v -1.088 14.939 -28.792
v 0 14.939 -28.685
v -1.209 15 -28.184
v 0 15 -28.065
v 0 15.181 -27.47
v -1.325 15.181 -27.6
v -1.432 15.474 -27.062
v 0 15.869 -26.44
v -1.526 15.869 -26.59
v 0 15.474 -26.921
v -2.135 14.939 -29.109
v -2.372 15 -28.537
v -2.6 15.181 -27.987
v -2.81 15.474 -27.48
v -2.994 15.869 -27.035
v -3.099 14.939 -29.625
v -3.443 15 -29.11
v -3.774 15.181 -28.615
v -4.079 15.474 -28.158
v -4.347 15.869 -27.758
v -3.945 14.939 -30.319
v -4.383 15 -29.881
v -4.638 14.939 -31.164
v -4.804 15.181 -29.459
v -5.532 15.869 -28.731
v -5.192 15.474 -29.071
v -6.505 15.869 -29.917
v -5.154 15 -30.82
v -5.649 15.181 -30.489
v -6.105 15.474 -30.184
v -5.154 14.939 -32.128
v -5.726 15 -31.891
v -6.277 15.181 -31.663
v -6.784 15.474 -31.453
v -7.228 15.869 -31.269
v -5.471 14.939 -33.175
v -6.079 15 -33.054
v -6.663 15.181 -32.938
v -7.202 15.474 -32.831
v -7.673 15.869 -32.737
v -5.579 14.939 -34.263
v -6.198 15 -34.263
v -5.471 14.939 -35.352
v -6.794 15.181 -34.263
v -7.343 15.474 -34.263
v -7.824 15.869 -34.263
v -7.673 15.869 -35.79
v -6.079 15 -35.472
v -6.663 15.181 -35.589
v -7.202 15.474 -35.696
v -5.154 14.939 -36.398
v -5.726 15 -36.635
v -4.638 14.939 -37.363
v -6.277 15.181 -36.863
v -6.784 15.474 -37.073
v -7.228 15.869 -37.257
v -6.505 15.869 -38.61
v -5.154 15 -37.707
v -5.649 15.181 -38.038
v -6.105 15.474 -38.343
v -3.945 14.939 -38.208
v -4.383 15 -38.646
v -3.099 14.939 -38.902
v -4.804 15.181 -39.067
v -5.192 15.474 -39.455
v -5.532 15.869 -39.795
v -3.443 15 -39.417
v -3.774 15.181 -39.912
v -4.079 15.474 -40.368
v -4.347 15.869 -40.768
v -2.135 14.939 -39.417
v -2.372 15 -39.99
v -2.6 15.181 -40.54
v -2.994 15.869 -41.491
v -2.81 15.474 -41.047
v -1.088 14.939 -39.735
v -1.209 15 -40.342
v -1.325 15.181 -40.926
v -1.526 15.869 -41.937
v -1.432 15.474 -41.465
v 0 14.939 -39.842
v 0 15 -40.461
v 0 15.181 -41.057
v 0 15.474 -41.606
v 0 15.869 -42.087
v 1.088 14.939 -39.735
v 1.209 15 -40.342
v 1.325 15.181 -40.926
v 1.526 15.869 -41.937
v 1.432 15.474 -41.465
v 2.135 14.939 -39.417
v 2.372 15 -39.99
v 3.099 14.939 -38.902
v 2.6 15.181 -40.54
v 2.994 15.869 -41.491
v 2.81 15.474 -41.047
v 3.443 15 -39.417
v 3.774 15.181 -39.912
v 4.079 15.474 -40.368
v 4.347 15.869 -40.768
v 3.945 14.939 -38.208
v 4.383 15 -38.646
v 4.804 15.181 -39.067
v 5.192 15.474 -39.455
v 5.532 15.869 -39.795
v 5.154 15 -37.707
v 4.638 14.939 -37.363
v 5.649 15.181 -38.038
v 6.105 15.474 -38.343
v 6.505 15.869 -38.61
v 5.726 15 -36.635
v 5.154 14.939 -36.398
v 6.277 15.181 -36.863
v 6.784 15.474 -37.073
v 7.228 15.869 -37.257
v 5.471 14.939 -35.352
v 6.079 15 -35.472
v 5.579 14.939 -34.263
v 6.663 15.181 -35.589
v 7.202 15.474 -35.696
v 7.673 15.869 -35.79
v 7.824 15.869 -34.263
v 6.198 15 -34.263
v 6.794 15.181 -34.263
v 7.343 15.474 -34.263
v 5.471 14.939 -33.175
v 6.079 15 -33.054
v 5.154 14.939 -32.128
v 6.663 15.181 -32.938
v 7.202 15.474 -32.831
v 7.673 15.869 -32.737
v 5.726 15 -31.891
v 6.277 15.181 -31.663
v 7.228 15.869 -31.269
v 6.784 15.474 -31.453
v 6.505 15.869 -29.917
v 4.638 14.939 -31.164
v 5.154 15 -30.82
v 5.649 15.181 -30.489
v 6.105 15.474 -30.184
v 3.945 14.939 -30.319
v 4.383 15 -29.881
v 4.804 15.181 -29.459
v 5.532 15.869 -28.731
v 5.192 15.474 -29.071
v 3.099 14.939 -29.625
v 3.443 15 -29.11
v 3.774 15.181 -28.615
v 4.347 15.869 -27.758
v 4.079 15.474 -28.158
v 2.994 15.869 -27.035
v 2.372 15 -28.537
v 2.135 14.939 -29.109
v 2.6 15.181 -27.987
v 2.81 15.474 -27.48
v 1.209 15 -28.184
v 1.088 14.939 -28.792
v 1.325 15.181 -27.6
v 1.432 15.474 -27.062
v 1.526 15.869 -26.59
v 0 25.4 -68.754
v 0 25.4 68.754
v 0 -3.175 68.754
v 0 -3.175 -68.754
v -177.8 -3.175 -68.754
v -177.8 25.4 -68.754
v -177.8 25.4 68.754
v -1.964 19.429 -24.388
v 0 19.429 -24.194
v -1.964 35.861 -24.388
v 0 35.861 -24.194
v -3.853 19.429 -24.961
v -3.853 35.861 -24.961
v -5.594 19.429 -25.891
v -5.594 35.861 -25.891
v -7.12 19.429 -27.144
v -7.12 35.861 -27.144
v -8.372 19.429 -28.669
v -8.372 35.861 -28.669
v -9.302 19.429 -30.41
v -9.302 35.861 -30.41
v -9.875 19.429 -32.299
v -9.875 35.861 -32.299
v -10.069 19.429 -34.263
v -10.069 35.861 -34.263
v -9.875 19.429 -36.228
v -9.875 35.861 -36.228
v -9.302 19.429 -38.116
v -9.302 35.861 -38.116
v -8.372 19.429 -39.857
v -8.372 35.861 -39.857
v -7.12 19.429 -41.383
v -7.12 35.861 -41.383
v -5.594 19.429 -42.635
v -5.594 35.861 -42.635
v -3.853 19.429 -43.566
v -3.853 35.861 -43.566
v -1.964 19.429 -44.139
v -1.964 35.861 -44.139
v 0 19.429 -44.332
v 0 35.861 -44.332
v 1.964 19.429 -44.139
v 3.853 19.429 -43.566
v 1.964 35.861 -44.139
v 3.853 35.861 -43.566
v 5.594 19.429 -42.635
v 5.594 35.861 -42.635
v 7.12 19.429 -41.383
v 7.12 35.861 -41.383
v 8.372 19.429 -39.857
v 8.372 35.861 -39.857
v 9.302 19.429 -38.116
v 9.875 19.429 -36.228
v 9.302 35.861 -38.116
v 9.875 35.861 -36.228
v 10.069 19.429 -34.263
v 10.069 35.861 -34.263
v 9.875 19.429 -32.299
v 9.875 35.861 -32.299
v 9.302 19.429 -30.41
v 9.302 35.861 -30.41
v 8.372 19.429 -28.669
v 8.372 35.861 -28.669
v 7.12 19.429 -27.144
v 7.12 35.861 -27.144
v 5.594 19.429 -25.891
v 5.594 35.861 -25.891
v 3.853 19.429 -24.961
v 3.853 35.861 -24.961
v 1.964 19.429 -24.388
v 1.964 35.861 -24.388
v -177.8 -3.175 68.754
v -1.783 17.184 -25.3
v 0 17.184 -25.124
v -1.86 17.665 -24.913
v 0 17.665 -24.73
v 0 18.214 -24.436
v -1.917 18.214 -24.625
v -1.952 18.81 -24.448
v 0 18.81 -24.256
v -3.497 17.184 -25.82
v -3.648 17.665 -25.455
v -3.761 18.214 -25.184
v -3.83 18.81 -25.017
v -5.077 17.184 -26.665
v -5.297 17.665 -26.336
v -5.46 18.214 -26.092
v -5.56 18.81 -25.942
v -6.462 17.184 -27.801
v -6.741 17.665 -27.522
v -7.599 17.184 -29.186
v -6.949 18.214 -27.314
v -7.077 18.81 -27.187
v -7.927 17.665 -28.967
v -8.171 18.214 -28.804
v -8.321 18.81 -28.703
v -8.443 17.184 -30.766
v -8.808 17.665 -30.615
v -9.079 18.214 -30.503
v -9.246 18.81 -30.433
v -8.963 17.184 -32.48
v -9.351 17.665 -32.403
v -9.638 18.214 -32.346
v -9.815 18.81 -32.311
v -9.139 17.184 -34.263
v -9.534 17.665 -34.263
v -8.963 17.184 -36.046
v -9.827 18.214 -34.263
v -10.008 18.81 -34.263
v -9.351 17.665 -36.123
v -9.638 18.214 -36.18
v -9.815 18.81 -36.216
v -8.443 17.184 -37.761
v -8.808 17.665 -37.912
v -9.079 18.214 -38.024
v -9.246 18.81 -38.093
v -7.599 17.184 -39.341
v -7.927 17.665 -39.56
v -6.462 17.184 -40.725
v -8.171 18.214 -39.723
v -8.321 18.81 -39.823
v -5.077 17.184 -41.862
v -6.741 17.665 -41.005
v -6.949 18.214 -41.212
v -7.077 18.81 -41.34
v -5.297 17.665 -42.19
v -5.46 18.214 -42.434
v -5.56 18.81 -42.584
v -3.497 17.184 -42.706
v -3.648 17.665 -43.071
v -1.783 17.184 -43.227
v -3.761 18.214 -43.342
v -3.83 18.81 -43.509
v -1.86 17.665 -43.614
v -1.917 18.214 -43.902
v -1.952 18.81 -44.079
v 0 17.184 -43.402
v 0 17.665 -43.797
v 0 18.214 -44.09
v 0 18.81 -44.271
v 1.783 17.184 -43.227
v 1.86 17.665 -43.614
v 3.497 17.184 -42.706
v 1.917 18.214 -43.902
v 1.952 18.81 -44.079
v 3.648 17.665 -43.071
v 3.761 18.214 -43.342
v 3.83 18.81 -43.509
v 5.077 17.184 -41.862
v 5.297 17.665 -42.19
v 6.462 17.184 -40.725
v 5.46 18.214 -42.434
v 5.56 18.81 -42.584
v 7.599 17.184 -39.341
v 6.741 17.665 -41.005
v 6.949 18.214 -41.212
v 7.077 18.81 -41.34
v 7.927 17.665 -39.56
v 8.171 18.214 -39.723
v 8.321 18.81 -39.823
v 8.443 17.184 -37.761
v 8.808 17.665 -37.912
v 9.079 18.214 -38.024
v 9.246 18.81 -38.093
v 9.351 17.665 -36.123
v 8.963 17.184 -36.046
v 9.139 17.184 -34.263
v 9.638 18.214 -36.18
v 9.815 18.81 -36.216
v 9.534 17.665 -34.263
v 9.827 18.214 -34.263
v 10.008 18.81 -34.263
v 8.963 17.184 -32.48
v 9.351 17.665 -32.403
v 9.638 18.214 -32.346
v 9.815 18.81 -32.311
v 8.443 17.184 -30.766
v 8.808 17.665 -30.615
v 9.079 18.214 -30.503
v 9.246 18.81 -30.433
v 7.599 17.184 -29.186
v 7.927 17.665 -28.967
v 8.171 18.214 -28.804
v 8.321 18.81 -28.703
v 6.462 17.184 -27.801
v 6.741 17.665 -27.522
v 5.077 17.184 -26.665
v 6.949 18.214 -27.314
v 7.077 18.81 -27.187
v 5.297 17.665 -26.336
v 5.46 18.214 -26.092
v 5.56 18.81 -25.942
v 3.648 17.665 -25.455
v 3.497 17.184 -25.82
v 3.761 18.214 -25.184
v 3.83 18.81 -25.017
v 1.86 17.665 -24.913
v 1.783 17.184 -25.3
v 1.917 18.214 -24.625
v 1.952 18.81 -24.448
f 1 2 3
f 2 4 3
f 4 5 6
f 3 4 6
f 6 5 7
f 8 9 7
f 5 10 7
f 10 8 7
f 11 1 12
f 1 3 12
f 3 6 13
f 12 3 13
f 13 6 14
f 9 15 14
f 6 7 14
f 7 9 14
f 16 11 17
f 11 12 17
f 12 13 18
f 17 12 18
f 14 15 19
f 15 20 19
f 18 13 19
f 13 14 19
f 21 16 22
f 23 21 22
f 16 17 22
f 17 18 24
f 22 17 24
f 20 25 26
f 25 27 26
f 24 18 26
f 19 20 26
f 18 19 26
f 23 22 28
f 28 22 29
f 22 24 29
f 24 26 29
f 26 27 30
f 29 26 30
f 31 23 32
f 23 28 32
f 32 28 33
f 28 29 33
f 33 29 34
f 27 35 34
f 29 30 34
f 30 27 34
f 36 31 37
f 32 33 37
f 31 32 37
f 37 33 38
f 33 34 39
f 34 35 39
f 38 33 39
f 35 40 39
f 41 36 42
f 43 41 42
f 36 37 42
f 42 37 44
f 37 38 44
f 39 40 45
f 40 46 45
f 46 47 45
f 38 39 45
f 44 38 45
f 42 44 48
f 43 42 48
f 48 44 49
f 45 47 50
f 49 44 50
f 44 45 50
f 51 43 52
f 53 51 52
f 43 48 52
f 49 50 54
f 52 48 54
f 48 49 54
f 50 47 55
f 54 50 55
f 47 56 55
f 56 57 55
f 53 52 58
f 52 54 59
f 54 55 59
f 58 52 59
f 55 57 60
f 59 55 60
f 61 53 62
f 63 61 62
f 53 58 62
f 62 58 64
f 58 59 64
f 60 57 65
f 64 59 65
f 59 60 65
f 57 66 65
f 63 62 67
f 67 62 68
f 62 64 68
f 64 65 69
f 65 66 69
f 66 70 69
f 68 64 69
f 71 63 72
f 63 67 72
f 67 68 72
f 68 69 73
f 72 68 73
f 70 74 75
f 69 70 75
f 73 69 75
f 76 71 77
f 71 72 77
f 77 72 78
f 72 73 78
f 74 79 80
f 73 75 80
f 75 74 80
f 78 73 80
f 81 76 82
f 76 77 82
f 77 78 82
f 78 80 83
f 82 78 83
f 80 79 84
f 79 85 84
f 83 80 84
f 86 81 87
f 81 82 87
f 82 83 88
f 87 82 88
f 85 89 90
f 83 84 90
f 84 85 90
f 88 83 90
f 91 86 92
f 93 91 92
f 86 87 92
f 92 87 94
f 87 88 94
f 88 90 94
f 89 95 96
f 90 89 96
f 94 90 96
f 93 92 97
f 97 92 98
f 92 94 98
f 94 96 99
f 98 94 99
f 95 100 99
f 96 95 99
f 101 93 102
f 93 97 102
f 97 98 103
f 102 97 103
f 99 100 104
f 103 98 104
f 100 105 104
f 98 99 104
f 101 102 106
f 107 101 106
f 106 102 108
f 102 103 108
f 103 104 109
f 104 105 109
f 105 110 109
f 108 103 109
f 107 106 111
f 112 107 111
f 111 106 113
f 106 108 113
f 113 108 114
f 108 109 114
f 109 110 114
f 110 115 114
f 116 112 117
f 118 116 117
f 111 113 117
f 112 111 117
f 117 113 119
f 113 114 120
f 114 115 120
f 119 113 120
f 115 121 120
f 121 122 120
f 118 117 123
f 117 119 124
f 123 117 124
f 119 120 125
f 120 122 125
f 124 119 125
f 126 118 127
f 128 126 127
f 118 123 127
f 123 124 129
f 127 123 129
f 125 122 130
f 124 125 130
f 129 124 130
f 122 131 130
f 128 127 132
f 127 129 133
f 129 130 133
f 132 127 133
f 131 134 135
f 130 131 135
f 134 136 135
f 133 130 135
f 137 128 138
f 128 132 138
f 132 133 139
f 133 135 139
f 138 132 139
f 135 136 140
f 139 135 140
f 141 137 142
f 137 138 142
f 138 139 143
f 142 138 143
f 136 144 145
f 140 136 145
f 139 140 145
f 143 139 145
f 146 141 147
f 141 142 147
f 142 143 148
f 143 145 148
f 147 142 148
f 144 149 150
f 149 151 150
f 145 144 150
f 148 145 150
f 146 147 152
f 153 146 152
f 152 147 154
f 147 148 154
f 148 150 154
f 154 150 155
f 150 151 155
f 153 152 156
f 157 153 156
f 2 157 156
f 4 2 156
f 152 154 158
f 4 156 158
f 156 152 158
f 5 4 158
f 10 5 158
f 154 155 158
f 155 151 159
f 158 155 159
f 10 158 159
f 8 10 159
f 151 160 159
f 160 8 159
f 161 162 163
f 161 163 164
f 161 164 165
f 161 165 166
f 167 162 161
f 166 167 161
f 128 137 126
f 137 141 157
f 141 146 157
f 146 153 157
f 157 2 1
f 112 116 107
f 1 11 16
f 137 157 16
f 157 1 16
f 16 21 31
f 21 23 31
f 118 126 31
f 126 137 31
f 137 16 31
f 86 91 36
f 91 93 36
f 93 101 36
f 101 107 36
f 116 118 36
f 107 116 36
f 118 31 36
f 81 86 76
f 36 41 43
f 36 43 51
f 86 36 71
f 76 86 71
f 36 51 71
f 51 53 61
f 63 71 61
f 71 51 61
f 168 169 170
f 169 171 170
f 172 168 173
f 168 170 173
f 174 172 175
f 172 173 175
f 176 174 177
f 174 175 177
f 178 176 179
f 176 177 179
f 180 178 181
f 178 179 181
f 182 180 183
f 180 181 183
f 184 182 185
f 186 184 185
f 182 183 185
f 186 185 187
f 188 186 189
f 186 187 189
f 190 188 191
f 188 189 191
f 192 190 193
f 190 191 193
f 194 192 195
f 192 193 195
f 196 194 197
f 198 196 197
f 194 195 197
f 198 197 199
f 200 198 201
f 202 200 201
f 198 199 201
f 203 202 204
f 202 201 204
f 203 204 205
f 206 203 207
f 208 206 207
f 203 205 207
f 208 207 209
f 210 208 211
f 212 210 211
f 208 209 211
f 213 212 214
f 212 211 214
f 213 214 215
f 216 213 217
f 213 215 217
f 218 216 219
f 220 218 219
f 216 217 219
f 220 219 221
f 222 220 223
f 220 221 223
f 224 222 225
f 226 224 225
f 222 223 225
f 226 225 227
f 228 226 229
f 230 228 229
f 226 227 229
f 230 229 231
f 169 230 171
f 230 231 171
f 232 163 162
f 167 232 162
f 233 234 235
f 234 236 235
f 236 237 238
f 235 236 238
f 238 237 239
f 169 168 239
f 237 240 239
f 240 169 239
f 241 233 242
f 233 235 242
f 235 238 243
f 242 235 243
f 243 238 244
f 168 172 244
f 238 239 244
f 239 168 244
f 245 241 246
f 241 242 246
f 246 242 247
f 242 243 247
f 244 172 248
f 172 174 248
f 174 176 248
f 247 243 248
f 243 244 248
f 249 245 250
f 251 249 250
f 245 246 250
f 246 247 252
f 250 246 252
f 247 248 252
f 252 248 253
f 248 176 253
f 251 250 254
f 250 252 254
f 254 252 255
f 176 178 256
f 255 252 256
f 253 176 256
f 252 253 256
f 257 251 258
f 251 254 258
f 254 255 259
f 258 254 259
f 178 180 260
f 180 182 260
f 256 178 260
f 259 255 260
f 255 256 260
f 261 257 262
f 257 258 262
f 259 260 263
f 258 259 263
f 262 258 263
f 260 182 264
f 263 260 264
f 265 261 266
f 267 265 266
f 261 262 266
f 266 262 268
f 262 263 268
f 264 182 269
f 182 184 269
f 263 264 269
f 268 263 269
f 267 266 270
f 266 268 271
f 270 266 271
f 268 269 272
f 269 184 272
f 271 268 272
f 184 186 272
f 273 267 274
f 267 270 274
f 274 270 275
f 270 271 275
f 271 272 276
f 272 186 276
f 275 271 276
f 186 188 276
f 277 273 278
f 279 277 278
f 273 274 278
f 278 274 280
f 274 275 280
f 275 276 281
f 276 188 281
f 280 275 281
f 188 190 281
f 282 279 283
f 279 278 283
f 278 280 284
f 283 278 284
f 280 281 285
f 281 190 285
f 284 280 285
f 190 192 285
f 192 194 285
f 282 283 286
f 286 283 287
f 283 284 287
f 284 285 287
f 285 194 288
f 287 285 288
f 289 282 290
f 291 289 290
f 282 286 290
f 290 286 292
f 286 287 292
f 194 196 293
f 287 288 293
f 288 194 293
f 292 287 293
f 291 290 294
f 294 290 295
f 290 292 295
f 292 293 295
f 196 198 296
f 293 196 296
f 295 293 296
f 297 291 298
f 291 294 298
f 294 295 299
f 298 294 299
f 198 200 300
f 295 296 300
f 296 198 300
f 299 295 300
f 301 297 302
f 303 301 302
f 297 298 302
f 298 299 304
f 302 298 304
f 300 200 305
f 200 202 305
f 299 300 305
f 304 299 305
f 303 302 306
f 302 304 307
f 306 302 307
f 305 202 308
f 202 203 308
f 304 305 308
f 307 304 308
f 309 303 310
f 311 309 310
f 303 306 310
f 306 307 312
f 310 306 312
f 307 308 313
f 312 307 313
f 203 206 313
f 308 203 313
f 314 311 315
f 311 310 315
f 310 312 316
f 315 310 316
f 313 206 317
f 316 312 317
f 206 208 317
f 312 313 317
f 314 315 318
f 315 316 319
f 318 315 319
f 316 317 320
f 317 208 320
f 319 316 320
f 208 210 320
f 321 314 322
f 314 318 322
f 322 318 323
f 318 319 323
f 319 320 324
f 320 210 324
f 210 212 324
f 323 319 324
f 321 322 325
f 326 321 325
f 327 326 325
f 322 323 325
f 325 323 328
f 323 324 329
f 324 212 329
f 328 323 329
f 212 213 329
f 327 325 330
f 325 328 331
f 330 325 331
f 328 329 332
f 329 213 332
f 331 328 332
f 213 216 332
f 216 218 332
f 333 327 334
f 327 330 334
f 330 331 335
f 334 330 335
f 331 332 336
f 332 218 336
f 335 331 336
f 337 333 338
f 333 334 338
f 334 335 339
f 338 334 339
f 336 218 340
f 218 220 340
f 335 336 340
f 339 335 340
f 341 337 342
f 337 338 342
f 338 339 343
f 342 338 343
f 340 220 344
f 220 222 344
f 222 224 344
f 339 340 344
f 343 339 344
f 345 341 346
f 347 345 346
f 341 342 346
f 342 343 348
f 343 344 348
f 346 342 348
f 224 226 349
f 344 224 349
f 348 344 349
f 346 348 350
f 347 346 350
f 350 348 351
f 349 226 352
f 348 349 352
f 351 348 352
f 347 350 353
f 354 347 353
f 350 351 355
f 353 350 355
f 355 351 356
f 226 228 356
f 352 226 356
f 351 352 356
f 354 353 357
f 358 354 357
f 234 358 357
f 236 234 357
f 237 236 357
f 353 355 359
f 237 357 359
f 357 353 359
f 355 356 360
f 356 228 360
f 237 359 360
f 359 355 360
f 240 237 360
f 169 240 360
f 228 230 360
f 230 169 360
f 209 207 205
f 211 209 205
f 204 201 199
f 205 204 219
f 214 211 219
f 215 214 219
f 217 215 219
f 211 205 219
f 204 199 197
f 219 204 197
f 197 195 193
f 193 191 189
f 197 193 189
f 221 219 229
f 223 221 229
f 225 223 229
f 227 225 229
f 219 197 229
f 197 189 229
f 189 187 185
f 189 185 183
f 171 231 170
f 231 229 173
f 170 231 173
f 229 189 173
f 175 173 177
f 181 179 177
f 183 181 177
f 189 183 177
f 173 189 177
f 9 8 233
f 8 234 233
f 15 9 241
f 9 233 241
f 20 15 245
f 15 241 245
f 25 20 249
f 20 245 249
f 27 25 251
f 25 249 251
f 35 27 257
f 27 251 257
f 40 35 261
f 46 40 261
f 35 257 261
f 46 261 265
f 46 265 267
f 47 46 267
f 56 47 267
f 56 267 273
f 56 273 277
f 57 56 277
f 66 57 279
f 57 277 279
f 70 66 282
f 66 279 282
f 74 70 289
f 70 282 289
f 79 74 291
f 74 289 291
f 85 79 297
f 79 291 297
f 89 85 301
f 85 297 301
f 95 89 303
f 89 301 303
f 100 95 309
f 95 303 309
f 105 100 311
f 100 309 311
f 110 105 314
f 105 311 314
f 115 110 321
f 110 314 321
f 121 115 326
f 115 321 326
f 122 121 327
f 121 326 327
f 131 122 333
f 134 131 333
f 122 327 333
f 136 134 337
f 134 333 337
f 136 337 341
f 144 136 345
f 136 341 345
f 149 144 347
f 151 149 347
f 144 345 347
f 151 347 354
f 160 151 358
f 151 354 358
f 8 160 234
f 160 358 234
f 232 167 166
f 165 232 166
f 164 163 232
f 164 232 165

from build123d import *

# Parameters (mm, degrees)
SKETCH1_W      = 137.507065568
SKETCH1_H      = 28.575
EXTRUDE1_DEPTH = 177.8


with BuildPart() as part:
    # Sketch1 → Extrude1 (new body)
    with BuildSketch(Plane(origin=(0, 0, 0), x_dir=(0, 0, -1), z_dir=(1, 0, 0))):
        with Locations((0, 11.1125)):
            Rectangle(SKETCH1_W, SKETCH1_H)
    extrude(amount=-EXTRUDE1_DEPTH)


with BuildPart() as body_2:
    # Sketch2 → Revolve1 (revolve)
    with BuildSketch(Plane(origin=(0, 0, 0), x_dir=(0, 0, -1), z_dir=(1, 0, 0)), mode=Mode.PRIVATE) as revolve1_sk:
        with BuildLine():
            Line((34.263280918, 35.860824198), (34.263280918, 14.939175802))
            Line((34.263280918, 14.939175802), (39.841939145, 14.939175802))
            ThreePointArc((39.841939145, 14.939175802), (41.056959043, 15.180858287), (42.087003175, 15.869111772))
            Line((42.087003175, 15.869111772), (43.402131236, 17.184239833))
            ThreePointArc((43.402131236, 17.184239833), (44.090384721, 18.214283965), (44.332067206, 19.429303863))
            Line((44.332067206, 19.429303863), (44.332067206, 35.860824198))
            Line((44.332067206, 35.860824198), (34.263280918, 35.860824198))
        make_face()
    revolve(revolve1_sk.sketch.rotate(Axis((0, 35.860824198, -34.263280918), (0, -1, 0)), 180), axis=Axis((0, 35.860824198, -34.263280918), (0, -1, 0)))


solid = Compound([part.part, body_2.part])
